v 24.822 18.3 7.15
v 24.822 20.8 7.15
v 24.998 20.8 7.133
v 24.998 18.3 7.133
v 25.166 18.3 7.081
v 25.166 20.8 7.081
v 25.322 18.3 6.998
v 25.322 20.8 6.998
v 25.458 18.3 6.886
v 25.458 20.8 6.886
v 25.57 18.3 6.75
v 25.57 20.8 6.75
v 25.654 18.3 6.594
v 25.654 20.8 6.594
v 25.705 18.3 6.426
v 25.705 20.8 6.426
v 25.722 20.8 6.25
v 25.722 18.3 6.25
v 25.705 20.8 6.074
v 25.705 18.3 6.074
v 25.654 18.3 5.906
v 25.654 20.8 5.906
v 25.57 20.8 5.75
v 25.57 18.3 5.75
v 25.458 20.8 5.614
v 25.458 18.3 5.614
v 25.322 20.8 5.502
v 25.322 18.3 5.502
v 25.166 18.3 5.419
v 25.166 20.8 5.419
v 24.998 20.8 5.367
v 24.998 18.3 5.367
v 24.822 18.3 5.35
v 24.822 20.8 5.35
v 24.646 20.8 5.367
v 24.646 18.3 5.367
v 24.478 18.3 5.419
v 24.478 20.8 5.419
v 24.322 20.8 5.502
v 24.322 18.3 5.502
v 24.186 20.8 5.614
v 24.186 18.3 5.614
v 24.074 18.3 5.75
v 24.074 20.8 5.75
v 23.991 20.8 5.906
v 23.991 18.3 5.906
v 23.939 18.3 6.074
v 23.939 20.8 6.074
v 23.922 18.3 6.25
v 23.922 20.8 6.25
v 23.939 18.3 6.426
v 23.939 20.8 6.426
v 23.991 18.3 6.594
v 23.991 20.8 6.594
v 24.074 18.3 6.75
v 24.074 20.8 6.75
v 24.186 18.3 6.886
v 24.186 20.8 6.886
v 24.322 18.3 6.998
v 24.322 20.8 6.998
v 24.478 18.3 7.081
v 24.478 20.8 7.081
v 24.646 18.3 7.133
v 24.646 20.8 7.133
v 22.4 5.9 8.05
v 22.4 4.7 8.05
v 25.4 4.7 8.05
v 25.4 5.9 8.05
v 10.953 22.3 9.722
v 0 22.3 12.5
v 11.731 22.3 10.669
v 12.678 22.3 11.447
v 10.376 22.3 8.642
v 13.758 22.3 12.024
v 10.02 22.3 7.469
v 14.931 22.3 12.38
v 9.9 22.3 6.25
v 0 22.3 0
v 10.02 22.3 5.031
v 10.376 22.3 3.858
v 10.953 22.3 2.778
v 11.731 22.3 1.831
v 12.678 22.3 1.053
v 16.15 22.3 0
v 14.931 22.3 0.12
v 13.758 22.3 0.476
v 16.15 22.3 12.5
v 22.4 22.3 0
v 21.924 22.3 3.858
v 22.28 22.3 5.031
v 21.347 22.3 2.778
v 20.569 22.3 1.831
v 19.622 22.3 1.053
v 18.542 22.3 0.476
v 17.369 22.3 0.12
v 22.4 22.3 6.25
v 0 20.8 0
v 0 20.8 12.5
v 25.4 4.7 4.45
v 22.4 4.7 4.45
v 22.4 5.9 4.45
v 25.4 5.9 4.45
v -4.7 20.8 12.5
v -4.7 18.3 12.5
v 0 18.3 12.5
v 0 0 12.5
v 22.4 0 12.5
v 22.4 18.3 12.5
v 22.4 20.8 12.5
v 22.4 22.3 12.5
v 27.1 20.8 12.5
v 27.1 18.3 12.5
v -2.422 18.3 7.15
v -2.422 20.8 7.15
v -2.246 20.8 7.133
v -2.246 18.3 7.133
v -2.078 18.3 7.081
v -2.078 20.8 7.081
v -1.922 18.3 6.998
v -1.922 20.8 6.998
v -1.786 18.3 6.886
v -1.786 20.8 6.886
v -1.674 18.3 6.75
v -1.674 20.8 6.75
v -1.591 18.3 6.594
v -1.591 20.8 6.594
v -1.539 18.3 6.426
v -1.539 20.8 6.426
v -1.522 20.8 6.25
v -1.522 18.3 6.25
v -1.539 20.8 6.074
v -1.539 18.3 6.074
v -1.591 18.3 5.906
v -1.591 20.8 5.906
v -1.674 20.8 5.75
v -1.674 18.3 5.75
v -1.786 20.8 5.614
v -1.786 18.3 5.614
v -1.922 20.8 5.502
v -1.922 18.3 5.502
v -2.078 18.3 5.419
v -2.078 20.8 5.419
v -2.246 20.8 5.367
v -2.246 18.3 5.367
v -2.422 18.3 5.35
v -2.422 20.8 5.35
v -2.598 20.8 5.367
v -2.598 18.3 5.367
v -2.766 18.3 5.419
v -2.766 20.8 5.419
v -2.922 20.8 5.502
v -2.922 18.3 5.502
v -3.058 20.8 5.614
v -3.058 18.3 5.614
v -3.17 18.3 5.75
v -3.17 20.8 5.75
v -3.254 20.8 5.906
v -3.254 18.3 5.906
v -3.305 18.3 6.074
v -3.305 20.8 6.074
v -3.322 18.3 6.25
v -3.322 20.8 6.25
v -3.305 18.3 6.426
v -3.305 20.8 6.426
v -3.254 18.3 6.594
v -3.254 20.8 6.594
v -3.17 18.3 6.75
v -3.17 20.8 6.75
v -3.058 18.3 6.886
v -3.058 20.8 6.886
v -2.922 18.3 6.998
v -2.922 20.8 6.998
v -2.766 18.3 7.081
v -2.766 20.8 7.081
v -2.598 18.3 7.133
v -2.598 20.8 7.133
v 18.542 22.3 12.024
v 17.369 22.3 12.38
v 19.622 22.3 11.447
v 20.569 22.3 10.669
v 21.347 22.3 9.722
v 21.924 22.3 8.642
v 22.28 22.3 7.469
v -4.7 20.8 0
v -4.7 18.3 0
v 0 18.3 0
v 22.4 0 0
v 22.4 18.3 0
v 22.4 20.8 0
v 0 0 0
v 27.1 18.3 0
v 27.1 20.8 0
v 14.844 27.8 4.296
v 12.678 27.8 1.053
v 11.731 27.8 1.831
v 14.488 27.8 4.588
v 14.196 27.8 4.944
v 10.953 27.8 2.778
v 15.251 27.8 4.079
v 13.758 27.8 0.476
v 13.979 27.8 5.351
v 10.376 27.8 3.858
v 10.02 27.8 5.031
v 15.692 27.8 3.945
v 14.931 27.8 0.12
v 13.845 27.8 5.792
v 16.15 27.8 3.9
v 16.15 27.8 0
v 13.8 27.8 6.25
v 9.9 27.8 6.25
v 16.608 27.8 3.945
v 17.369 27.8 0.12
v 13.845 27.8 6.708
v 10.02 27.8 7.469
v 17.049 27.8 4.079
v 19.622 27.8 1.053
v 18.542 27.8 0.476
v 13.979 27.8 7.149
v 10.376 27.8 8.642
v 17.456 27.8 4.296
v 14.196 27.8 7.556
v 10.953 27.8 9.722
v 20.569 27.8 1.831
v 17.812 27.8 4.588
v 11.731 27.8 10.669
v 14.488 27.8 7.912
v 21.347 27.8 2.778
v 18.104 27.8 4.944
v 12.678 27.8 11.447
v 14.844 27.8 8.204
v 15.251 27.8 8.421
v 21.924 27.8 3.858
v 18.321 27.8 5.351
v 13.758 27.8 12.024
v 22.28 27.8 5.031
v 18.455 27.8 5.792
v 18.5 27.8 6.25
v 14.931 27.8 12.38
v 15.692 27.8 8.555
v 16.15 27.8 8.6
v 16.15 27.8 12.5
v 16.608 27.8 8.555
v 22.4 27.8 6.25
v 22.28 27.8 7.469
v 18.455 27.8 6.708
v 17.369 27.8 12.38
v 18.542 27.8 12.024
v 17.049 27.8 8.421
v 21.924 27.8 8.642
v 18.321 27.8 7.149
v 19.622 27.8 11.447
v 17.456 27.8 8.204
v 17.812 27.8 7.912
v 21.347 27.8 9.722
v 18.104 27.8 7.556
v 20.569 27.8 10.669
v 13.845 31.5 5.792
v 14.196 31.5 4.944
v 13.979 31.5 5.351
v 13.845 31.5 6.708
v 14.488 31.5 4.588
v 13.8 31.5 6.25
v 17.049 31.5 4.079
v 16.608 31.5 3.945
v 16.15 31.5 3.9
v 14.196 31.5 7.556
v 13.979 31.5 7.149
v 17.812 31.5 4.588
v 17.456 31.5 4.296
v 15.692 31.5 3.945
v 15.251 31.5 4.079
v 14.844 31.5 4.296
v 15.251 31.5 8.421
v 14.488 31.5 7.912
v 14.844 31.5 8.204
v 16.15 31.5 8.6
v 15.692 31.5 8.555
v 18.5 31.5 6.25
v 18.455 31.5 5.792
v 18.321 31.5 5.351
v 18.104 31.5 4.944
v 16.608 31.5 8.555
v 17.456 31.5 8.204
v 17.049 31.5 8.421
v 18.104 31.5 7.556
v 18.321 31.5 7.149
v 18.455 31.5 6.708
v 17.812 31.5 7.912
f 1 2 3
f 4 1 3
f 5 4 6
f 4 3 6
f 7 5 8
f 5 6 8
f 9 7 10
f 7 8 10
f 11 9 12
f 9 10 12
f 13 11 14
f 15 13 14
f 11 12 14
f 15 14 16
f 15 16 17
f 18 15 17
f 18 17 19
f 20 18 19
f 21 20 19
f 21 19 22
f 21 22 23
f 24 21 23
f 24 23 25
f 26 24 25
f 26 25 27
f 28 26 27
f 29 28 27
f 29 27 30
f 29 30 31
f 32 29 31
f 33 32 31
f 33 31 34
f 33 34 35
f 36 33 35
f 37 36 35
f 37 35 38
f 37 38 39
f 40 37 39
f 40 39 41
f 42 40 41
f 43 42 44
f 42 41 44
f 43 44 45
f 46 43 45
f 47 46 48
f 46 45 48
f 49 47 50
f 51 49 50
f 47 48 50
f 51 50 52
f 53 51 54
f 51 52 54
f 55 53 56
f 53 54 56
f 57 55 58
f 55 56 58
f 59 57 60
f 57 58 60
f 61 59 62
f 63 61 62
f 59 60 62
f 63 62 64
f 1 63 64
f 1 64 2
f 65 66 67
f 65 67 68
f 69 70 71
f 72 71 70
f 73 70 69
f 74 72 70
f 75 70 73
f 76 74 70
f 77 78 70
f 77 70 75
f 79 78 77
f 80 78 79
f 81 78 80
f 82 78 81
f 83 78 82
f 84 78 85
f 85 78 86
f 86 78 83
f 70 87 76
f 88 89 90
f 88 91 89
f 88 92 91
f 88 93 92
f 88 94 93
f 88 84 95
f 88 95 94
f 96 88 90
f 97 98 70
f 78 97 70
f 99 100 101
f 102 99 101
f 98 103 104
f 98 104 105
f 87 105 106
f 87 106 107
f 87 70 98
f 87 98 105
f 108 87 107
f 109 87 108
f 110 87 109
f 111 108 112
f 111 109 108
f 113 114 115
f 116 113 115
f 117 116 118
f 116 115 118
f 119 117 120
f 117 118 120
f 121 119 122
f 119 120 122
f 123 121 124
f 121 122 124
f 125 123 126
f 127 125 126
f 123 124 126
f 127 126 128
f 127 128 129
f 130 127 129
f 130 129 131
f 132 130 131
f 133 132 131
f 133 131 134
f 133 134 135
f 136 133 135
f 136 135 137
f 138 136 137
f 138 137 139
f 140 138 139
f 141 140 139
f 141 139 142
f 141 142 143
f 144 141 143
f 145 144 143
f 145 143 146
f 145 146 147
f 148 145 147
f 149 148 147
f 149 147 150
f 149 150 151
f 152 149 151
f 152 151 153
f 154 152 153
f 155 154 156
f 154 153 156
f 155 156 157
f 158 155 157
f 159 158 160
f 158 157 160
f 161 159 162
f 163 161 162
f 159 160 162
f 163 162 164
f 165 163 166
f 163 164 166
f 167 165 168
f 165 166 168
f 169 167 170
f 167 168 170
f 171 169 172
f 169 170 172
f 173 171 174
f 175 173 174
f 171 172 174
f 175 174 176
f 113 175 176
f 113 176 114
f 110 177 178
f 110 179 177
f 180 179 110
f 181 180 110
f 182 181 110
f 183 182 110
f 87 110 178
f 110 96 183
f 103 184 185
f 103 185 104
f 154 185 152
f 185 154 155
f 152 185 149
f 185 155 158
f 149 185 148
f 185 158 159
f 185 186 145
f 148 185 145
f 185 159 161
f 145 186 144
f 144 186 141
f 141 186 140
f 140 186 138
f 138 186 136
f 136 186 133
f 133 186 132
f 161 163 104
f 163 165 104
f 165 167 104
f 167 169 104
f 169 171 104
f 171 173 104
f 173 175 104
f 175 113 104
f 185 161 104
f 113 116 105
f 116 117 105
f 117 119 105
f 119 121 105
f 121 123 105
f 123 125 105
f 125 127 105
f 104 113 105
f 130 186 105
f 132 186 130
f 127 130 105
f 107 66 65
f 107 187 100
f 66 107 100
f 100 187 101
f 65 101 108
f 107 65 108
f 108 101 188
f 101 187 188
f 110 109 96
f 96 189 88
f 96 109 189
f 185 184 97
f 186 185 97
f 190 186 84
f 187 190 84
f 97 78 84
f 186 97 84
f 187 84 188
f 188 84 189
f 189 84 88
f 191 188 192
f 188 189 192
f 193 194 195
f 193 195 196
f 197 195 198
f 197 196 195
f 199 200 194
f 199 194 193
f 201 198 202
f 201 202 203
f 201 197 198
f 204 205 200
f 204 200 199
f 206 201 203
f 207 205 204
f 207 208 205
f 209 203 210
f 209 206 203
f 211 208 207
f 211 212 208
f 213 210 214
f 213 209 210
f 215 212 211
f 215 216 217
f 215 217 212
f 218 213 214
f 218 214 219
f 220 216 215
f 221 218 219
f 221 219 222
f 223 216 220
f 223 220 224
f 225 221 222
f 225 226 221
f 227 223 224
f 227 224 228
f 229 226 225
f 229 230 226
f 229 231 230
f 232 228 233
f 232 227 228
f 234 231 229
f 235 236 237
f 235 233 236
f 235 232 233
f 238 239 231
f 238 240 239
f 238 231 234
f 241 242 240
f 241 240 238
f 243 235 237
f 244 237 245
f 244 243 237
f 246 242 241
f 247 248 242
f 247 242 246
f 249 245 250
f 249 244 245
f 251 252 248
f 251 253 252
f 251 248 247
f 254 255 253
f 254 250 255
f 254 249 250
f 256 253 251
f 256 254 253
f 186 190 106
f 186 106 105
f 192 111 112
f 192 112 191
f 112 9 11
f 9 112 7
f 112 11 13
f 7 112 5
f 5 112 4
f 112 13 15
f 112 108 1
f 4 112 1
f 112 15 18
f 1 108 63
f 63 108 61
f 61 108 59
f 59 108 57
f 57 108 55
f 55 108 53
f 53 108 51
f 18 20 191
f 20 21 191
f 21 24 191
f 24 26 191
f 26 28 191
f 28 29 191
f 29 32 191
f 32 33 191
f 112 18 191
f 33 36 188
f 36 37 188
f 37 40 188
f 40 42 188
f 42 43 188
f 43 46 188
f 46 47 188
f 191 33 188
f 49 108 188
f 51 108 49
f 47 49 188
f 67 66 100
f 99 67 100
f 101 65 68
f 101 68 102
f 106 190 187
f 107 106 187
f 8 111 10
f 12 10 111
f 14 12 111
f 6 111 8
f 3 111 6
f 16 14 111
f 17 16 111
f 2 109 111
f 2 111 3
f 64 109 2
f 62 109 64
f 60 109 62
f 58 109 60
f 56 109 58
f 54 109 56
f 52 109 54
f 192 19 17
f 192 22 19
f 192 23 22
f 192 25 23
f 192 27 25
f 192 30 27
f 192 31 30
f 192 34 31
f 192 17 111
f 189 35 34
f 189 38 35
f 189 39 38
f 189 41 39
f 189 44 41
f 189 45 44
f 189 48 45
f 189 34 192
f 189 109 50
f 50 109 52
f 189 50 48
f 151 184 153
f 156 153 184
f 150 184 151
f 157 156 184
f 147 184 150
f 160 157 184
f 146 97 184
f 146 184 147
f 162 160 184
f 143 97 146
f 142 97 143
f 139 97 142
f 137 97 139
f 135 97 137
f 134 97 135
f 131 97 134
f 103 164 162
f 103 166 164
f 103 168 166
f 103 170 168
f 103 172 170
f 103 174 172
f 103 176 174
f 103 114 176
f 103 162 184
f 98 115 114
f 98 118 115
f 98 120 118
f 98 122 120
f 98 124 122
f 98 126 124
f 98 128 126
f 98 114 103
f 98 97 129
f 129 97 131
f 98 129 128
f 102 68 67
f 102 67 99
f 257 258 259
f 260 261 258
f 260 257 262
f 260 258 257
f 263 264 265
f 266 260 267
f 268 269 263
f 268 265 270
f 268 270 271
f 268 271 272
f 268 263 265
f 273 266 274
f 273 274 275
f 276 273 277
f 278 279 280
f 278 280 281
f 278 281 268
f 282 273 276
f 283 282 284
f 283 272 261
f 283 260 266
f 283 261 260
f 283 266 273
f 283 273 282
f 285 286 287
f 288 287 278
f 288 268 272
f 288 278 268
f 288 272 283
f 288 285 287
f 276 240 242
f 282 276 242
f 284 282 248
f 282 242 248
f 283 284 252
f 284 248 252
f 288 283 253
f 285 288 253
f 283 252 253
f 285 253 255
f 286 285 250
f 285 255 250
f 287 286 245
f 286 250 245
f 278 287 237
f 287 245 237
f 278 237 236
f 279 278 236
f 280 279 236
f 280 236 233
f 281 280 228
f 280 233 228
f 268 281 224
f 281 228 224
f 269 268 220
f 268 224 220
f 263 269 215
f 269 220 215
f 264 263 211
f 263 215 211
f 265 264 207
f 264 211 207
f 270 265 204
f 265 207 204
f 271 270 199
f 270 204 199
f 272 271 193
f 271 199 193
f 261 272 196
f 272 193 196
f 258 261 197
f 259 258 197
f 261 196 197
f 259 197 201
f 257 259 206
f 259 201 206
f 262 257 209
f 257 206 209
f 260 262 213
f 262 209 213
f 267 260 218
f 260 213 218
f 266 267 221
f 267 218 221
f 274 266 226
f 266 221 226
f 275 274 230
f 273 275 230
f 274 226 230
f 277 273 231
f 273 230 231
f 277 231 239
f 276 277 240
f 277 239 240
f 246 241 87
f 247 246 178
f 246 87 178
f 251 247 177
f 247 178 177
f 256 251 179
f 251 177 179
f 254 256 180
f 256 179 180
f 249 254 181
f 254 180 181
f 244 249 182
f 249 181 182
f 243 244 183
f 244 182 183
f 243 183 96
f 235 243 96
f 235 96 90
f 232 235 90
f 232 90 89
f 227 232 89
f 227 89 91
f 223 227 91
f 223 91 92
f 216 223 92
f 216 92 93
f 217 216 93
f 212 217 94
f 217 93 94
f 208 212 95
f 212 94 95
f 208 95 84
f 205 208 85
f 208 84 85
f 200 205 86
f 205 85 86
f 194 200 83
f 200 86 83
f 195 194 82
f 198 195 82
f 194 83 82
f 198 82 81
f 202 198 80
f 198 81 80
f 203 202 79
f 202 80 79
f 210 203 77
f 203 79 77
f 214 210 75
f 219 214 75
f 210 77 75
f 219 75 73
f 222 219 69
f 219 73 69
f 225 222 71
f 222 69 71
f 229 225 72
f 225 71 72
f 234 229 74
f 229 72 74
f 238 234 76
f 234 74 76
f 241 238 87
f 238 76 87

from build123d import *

# Parameters (mm, degrees)
SKETCH_1_W          = 22.4
SKETCH_1_H          = 22.3
EXTRUDE_1_DEPTH     = 12.5
SKETCH_5_R          = 6.25
EXTRUDE_4_DEPTH     = 5.5
SKETCH_6_R          = 2.35
EXTRUDE_5_DEPTH     = 3.7
SKETCH_10_W         = 12.5
SKETCH_10_H         = 2.5
EXTRUDE_8_DEPTH     = 4.7
SKETCH_11_W         = 12.5
SKETCH_11_H         = 2.5
EXTRUDE_9_DEPTH     = 4.7
SKETCH_12_R         = 0.9
CUT_EXTRUDE_2_DEPTH = 4.7
SKETCH_13_W         = 3.6
SKETCH_13_H         = 1.2
EXTRUDE_10_DEPTH    = 3


with BuildPart() as part:
    # 草图1 → 凸台-拉伸1 (new body)
    with BuildSketch(Plane.XY):
        with Locations((11.2, 11.15)):
            Rectangle(SKETCH_1_W, SKETCH_1_H)
    extrude(amount=EXTRUDE_1_DEPTH)

    # 草图5 → 凸台-拉伸4 (add)
    with BuildSketch(Plane(origin=(0, 22.3, 0), x_dir=(1, 0, 0), z_dir=(0, 1, 0))):
        with Locations(Location((16.15, -6.25, 0), (0, 0, 270))):
            Circle(SKETCH_5_R)
    extrude(amount=EXTRUDE_4_DEPTH)

    # 草图6 → 凸台-拉伸5 (add)
    with BuildSketch(Plane(origin=(0, 27.8, 0), x_dir=(1, 0, 0), z_dir=(0, 1, 0))):
        with Locations(Location((16.15, -6.25, 0), (0, 0, 270))):
            Circle(SKETCH_6_R)
    extrude(amount=EXTRUDE_5_DEPTH)

    # 草图10 → 凸台-拉伸8 (add)
    with BuildSketch(Plane(origin=(22.4, 0, 0), x_dir=(0, 0, -1), z_dir=(1, 0, 0))):
        with Locations((-6.25, 19.55)):
            Rectangle(SKETCH_10_W, SKETCH_10_H)
    extrude(amount=EXTRUDE_8_DEPTH)

    # 草图11 → 凸台-拉伸9 (add)
    with BuildSketch(Plane.ZY):
        with Locations((6.25, 19.55)):
            Rectangle(SKETCH_11_W, SKETCH_11_H)
    extrude(amount=EXTRUDE_9_DEPTH)

    # 草图12 → 切除-拉伸2 (cut)
    with BuildSketch(Plane(origin=(0, 20.8, 0), x_dir=(1, 0, 0), z_dir=(0, 1, 0))):
        with Locations(Location((-2.422009123, -6.25, 0), (0, 0, 270))):
            Circle(SKETCH_12_R)
        with Locations(Location((24.822009123, -6.25, 0), (0, 0, 270))):
            Circle(SKETCH_12_R)
    extrude(amount=-CUT_EXTRUDE_2_DEPTH, mode=Mode.SUBTRACT)

    # 草图13 → 凸台-拉伸10 (add)
    with BuildSketch(Plane(origin=(22.4, 0, 0), x_dir=(0, 0, -1), z_dir=(1, 0, 0))):
        with Locations((-6.25, 5.3)):
            Rectangle(SKETCH_13_W, SKETCH_13_H)
    extrude(amount=EXTRUDE_10_DEPTH)


solid = part.part
